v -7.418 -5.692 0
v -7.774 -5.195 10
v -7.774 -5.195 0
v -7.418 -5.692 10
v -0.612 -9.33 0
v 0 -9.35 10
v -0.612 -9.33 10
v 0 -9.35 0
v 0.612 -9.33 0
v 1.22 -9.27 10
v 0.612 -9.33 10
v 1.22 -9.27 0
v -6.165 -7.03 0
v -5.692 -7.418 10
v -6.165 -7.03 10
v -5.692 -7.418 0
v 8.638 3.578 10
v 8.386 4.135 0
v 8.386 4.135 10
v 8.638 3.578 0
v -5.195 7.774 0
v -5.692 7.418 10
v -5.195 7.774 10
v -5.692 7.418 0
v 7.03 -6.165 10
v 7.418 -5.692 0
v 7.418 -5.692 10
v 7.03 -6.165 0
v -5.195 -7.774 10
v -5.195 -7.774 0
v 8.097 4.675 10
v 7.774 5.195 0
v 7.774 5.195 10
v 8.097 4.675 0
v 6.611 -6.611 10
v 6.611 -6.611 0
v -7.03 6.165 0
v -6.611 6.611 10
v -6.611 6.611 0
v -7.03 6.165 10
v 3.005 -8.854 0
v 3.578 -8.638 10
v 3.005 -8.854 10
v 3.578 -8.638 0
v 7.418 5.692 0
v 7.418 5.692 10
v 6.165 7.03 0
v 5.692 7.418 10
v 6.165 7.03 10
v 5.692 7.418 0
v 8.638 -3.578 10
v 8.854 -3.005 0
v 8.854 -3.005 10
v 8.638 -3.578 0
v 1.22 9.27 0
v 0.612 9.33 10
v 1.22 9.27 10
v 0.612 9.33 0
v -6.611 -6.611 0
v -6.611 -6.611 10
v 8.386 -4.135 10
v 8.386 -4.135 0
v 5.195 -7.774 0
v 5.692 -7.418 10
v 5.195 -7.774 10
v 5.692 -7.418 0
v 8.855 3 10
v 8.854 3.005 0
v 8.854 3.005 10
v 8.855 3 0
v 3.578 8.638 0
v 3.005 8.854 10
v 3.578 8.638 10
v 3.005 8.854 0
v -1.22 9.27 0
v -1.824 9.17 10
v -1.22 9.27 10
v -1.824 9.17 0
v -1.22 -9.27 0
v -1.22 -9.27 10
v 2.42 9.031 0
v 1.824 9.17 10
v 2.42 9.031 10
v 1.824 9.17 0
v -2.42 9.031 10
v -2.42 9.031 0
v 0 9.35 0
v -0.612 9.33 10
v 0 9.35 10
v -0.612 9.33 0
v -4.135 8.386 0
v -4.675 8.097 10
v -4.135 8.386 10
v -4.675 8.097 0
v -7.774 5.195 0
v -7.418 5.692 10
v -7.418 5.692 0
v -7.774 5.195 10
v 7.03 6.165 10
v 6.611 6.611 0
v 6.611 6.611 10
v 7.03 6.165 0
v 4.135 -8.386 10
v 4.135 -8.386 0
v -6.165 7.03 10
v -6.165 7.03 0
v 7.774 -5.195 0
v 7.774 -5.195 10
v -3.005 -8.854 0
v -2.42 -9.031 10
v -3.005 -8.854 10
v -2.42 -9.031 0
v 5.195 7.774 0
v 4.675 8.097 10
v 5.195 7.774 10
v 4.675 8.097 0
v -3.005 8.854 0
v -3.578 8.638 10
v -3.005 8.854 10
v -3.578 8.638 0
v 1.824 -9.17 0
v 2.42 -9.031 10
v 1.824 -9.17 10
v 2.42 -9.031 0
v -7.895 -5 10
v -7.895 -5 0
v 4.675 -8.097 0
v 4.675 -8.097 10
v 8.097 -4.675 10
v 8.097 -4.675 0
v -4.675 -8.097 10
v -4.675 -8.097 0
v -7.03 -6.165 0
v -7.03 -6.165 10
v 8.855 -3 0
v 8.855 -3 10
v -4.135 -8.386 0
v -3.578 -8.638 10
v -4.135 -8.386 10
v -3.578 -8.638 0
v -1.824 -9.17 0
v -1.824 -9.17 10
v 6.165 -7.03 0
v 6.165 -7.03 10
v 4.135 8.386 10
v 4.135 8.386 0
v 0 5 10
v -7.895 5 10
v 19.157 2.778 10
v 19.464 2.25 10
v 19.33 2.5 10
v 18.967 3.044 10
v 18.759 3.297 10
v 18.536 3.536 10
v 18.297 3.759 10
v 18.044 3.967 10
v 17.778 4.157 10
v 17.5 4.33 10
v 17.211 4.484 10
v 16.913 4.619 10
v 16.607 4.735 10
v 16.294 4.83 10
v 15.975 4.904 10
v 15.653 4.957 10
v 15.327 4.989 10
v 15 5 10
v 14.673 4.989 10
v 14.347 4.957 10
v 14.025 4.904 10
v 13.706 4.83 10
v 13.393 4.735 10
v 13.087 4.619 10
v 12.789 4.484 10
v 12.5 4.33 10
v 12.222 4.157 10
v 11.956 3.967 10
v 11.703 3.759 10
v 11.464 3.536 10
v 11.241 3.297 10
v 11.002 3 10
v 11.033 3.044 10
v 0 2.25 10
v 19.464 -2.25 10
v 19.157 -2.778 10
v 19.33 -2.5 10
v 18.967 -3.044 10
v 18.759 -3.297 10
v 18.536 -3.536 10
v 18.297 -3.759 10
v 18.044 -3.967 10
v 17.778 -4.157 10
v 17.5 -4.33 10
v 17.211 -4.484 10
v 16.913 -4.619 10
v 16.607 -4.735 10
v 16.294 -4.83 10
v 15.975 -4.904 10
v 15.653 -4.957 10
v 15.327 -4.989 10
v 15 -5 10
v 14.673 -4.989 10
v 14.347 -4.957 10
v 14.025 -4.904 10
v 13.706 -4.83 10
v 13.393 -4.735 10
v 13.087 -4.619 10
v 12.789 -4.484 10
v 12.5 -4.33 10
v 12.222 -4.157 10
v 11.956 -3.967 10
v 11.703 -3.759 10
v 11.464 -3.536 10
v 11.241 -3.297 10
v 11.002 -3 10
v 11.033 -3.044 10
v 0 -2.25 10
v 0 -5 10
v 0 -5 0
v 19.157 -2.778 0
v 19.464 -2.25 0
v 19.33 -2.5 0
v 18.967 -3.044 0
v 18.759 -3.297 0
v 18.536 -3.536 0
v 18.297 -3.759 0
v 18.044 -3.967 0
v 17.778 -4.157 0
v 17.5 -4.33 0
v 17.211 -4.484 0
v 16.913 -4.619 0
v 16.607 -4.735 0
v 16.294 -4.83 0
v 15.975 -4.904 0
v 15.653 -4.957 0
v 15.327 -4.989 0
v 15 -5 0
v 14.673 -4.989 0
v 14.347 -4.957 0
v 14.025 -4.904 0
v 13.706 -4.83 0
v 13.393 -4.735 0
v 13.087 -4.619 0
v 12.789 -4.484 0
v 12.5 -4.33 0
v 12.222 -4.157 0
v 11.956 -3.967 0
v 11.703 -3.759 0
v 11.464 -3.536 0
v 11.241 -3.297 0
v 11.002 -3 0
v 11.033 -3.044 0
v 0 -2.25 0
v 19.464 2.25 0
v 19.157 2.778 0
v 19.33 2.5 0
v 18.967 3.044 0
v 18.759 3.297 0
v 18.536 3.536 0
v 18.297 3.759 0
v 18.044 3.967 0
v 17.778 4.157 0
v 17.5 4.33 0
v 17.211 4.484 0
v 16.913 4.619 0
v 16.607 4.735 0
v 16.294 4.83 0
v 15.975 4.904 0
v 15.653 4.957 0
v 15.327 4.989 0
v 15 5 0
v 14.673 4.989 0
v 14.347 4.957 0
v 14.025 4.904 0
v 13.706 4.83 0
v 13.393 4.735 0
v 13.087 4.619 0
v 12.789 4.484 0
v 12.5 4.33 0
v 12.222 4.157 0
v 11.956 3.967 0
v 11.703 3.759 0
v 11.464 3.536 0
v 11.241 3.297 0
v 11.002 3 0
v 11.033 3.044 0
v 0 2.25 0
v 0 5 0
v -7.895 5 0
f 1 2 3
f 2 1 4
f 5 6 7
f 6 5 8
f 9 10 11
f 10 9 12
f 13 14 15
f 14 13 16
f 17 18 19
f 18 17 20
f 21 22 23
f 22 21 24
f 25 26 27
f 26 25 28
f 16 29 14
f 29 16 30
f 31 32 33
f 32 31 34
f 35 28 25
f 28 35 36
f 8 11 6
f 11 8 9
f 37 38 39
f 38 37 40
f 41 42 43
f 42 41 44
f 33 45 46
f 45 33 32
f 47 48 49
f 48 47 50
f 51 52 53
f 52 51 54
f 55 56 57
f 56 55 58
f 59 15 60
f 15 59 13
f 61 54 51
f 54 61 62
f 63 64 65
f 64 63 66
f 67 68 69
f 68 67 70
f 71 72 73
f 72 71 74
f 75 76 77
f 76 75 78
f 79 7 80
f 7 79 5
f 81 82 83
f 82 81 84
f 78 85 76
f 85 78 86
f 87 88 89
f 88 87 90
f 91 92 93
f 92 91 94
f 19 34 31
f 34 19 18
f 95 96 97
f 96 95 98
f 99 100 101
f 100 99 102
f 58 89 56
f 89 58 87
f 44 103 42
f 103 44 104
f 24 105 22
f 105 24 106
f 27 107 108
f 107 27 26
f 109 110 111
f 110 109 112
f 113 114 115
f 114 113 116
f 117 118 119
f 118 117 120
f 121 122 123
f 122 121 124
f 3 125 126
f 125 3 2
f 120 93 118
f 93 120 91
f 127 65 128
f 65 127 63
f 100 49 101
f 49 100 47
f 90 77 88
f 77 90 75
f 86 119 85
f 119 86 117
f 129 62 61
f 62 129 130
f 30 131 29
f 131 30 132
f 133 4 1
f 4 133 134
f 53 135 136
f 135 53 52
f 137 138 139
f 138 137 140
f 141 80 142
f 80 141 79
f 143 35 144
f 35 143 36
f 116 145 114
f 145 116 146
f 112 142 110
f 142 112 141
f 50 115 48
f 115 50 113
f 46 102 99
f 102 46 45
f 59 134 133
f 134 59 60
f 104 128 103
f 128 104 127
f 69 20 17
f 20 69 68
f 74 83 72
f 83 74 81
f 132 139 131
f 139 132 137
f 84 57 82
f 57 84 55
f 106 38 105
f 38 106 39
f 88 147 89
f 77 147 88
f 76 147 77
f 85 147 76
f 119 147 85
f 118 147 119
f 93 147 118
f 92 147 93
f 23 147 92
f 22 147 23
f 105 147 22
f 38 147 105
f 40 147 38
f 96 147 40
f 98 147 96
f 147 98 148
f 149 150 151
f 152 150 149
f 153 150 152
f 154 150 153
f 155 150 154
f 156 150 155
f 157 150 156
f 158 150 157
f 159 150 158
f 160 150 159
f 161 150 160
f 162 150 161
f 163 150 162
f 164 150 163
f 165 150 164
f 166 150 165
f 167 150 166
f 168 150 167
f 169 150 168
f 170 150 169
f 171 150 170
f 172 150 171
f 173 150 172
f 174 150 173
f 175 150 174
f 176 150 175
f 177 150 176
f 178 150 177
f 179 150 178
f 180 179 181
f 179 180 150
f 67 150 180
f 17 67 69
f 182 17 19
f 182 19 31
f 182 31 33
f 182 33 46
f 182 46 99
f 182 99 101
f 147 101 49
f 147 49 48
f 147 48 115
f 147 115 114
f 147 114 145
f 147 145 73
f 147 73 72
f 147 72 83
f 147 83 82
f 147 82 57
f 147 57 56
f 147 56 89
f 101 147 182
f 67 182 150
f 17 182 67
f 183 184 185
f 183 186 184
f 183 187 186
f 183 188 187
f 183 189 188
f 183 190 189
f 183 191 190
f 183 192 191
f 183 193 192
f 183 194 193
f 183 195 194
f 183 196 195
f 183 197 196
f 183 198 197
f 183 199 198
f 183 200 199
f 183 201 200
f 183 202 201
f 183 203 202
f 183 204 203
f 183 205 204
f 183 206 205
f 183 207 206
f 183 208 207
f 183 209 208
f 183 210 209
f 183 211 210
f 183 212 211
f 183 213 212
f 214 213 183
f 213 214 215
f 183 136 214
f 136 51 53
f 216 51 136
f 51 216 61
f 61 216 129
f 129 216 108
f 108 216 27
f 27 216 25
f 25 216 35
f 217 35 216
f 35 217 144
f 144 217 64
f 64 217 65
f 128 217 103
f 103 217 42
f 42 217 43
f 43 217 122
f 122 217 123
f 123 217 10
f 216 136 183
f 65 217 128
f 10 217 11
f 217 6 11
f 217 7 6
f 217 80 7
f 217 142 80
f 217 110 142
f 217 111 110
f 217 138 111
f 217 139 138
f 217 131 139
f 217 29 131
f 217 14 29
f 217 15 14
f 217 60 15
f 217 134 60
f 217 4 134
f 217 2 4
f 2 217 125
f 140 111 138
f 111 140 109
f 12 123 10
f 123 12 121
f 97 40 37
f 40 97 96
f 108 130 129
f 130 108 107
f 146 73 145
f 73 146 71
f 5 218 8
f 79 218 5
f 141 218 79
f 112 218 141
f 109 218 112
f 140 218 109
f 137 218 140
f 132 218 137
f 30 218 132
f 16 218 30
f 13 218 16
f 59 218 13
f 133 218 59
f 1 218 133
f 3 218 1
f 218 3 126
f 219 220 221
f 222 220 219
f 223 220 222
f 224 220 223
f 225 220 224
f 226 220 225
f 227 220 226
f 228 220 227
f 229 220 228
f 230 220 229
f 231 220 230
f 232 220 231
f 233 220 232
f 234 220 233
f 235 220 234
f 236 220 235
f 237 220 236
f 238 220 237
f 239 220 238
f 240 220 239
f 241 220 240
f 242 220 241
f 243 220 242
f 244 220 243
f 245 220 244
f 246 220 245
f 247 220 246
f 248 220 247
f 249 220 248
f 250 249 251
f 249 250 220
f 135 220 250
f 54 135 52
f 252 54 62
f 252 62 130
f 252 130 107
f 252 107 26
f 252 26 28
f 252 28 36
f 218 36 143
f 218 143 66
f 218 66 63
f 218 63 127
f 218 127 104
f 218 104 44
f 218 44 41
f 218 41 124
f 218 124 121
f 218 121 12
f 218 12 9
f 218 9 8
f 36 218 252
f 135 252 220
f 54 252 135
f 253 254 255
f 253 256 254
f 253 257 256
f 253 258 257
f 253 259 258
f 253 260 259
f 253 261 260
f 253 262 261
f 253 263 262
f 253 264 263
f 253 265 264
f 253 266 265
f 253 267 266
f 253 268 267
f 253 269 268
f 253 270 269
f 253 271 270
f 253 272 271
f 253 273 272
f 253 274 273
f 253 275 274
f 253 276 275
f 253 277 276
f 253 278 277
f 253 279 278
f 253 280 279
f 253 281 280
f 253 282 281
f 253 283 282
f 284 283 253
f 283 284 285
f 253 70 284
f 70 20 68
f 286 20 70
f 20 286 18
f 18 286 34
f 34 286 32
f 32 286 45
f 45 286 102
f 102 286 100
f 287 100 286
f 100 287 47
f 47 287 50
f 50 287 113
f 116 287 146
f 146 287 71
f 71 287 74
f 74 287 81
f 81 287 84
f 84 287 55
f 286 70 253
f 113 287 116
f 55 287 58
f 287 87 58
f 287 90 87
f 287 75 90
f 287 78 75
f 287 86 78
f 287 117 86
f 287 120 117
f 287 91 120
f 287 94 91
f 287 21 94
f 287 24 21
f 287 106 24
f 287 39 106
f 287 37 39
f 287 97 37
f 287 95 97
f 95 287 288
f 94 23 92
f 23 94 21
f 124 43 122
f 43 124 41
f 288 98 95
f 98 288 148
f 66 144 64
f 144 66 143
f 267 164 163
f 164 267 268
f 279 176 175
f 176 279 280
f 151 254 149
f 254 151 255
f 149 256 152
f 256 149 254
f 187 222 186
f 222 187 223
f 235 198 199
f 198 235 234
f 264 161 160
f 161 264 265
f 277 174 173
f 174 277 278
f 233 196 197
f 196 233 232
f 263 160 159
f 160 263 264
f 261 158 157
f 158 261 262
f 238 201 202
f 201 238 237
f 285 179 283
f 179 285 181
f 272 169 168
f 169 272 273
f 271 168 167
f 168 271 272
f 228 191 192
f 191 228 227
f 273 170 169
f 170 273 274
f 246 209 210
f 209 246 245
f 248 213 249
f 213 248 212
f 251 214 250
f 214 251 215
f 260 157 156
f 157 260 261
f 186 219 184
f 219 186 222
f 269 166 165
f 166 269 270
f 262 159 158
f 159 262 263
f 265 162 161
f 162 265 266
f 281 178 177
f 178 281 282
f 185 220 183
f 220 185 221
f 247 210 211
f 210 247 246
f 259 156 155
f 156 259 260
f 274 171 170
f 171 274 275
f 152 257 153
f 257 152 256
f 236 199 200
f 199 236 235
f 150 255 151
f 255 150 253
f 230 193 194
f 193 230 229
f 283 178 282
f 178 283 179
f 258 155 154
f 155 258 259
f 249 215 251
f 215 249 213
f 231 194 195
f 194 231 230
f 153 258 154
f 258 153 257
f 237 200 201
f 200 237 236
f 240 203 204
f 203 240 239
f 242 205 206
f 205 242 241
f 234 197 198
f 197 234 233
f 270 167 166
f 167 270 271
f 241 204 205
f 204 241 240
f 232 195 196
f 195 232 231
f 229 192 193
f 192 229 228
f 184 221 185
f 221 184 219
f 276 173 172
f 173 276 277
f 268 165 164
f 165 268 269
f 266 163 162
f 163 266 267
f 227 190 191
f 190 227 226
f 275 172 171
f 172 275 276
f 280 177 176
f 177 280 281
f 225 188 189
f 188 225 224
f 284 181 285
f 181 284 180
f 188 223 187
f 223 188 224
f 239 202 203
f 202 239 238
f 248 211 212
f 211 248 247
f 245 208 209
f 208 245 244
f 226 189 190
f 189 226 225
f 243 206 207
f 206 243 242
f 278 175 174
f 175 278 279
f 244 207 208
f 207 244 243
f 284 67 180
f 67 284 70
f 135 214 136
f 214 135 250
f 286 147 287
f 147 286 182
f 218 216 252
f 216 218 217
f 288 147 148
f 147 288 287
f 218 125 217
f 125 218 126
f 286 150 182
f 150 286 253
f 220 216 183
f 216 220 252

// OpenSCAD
// Tubing and stand rod snap-on clip
// Print orientation: flat on bed, z = 0 up to z = 10

// ---- Stand rod ring ----
stand_d  = 12.7;   // stand rod diameter
stand_w  = 3;      // stand ring wall
stand_r  = stand_d / 2 + stand_w;  // 18.7 mm outer radius
stand_x  = -15;    // opening extends to x = -15 (clearance)

// ---- Tubing ring ----
tube_d   = 6;      // tubing inner diameter
tube_w   = 2;      // tubing wall
tube_r   = tube_d / 2 + tube_w;   // 5 mm outer radius
tube_x   = 15;     // tubing ring centre x
tube_y   = 0;      // tubing ring centre y
tube_x0  = tube_x - 15;  // opening start x (9)
tube_x1  = tube_x + 15;  // opening end x (30)

// ---- Bridge ----
bridge_w = 6;      // bridge width (Y)
bridge_x0 = 8;     // bridge start x
bridge_x1 = 12;    // bridge end x

// ---- Misc ----
eps = 0.5;         // cutter overshoot
$fn = 96;

difference() {
    union() {
        // Stand ring
        cylinder(r = stand_r, h = 10);
        // Tubing ring
        translate([tube_x, tube_y, 0])
            cylinder(r = tube_r, h = 10);
        // Bridge
        translate([bridge_x0, -bridge_w / 2, 0])
            cube([bridge_x1 - bridge_x0, bridge_w, 10]);
    }
    // Stand rod opening
    translate([stand_x, -5, -eps])
        cube([15, 10, 10 + 2 * eps]);
    // Tubing opening
    translate([tube_x0, -2.25, -eps])
        cube([tube_x1 - tube_x0, 4.5, 10 + 2 * eps]);
}
